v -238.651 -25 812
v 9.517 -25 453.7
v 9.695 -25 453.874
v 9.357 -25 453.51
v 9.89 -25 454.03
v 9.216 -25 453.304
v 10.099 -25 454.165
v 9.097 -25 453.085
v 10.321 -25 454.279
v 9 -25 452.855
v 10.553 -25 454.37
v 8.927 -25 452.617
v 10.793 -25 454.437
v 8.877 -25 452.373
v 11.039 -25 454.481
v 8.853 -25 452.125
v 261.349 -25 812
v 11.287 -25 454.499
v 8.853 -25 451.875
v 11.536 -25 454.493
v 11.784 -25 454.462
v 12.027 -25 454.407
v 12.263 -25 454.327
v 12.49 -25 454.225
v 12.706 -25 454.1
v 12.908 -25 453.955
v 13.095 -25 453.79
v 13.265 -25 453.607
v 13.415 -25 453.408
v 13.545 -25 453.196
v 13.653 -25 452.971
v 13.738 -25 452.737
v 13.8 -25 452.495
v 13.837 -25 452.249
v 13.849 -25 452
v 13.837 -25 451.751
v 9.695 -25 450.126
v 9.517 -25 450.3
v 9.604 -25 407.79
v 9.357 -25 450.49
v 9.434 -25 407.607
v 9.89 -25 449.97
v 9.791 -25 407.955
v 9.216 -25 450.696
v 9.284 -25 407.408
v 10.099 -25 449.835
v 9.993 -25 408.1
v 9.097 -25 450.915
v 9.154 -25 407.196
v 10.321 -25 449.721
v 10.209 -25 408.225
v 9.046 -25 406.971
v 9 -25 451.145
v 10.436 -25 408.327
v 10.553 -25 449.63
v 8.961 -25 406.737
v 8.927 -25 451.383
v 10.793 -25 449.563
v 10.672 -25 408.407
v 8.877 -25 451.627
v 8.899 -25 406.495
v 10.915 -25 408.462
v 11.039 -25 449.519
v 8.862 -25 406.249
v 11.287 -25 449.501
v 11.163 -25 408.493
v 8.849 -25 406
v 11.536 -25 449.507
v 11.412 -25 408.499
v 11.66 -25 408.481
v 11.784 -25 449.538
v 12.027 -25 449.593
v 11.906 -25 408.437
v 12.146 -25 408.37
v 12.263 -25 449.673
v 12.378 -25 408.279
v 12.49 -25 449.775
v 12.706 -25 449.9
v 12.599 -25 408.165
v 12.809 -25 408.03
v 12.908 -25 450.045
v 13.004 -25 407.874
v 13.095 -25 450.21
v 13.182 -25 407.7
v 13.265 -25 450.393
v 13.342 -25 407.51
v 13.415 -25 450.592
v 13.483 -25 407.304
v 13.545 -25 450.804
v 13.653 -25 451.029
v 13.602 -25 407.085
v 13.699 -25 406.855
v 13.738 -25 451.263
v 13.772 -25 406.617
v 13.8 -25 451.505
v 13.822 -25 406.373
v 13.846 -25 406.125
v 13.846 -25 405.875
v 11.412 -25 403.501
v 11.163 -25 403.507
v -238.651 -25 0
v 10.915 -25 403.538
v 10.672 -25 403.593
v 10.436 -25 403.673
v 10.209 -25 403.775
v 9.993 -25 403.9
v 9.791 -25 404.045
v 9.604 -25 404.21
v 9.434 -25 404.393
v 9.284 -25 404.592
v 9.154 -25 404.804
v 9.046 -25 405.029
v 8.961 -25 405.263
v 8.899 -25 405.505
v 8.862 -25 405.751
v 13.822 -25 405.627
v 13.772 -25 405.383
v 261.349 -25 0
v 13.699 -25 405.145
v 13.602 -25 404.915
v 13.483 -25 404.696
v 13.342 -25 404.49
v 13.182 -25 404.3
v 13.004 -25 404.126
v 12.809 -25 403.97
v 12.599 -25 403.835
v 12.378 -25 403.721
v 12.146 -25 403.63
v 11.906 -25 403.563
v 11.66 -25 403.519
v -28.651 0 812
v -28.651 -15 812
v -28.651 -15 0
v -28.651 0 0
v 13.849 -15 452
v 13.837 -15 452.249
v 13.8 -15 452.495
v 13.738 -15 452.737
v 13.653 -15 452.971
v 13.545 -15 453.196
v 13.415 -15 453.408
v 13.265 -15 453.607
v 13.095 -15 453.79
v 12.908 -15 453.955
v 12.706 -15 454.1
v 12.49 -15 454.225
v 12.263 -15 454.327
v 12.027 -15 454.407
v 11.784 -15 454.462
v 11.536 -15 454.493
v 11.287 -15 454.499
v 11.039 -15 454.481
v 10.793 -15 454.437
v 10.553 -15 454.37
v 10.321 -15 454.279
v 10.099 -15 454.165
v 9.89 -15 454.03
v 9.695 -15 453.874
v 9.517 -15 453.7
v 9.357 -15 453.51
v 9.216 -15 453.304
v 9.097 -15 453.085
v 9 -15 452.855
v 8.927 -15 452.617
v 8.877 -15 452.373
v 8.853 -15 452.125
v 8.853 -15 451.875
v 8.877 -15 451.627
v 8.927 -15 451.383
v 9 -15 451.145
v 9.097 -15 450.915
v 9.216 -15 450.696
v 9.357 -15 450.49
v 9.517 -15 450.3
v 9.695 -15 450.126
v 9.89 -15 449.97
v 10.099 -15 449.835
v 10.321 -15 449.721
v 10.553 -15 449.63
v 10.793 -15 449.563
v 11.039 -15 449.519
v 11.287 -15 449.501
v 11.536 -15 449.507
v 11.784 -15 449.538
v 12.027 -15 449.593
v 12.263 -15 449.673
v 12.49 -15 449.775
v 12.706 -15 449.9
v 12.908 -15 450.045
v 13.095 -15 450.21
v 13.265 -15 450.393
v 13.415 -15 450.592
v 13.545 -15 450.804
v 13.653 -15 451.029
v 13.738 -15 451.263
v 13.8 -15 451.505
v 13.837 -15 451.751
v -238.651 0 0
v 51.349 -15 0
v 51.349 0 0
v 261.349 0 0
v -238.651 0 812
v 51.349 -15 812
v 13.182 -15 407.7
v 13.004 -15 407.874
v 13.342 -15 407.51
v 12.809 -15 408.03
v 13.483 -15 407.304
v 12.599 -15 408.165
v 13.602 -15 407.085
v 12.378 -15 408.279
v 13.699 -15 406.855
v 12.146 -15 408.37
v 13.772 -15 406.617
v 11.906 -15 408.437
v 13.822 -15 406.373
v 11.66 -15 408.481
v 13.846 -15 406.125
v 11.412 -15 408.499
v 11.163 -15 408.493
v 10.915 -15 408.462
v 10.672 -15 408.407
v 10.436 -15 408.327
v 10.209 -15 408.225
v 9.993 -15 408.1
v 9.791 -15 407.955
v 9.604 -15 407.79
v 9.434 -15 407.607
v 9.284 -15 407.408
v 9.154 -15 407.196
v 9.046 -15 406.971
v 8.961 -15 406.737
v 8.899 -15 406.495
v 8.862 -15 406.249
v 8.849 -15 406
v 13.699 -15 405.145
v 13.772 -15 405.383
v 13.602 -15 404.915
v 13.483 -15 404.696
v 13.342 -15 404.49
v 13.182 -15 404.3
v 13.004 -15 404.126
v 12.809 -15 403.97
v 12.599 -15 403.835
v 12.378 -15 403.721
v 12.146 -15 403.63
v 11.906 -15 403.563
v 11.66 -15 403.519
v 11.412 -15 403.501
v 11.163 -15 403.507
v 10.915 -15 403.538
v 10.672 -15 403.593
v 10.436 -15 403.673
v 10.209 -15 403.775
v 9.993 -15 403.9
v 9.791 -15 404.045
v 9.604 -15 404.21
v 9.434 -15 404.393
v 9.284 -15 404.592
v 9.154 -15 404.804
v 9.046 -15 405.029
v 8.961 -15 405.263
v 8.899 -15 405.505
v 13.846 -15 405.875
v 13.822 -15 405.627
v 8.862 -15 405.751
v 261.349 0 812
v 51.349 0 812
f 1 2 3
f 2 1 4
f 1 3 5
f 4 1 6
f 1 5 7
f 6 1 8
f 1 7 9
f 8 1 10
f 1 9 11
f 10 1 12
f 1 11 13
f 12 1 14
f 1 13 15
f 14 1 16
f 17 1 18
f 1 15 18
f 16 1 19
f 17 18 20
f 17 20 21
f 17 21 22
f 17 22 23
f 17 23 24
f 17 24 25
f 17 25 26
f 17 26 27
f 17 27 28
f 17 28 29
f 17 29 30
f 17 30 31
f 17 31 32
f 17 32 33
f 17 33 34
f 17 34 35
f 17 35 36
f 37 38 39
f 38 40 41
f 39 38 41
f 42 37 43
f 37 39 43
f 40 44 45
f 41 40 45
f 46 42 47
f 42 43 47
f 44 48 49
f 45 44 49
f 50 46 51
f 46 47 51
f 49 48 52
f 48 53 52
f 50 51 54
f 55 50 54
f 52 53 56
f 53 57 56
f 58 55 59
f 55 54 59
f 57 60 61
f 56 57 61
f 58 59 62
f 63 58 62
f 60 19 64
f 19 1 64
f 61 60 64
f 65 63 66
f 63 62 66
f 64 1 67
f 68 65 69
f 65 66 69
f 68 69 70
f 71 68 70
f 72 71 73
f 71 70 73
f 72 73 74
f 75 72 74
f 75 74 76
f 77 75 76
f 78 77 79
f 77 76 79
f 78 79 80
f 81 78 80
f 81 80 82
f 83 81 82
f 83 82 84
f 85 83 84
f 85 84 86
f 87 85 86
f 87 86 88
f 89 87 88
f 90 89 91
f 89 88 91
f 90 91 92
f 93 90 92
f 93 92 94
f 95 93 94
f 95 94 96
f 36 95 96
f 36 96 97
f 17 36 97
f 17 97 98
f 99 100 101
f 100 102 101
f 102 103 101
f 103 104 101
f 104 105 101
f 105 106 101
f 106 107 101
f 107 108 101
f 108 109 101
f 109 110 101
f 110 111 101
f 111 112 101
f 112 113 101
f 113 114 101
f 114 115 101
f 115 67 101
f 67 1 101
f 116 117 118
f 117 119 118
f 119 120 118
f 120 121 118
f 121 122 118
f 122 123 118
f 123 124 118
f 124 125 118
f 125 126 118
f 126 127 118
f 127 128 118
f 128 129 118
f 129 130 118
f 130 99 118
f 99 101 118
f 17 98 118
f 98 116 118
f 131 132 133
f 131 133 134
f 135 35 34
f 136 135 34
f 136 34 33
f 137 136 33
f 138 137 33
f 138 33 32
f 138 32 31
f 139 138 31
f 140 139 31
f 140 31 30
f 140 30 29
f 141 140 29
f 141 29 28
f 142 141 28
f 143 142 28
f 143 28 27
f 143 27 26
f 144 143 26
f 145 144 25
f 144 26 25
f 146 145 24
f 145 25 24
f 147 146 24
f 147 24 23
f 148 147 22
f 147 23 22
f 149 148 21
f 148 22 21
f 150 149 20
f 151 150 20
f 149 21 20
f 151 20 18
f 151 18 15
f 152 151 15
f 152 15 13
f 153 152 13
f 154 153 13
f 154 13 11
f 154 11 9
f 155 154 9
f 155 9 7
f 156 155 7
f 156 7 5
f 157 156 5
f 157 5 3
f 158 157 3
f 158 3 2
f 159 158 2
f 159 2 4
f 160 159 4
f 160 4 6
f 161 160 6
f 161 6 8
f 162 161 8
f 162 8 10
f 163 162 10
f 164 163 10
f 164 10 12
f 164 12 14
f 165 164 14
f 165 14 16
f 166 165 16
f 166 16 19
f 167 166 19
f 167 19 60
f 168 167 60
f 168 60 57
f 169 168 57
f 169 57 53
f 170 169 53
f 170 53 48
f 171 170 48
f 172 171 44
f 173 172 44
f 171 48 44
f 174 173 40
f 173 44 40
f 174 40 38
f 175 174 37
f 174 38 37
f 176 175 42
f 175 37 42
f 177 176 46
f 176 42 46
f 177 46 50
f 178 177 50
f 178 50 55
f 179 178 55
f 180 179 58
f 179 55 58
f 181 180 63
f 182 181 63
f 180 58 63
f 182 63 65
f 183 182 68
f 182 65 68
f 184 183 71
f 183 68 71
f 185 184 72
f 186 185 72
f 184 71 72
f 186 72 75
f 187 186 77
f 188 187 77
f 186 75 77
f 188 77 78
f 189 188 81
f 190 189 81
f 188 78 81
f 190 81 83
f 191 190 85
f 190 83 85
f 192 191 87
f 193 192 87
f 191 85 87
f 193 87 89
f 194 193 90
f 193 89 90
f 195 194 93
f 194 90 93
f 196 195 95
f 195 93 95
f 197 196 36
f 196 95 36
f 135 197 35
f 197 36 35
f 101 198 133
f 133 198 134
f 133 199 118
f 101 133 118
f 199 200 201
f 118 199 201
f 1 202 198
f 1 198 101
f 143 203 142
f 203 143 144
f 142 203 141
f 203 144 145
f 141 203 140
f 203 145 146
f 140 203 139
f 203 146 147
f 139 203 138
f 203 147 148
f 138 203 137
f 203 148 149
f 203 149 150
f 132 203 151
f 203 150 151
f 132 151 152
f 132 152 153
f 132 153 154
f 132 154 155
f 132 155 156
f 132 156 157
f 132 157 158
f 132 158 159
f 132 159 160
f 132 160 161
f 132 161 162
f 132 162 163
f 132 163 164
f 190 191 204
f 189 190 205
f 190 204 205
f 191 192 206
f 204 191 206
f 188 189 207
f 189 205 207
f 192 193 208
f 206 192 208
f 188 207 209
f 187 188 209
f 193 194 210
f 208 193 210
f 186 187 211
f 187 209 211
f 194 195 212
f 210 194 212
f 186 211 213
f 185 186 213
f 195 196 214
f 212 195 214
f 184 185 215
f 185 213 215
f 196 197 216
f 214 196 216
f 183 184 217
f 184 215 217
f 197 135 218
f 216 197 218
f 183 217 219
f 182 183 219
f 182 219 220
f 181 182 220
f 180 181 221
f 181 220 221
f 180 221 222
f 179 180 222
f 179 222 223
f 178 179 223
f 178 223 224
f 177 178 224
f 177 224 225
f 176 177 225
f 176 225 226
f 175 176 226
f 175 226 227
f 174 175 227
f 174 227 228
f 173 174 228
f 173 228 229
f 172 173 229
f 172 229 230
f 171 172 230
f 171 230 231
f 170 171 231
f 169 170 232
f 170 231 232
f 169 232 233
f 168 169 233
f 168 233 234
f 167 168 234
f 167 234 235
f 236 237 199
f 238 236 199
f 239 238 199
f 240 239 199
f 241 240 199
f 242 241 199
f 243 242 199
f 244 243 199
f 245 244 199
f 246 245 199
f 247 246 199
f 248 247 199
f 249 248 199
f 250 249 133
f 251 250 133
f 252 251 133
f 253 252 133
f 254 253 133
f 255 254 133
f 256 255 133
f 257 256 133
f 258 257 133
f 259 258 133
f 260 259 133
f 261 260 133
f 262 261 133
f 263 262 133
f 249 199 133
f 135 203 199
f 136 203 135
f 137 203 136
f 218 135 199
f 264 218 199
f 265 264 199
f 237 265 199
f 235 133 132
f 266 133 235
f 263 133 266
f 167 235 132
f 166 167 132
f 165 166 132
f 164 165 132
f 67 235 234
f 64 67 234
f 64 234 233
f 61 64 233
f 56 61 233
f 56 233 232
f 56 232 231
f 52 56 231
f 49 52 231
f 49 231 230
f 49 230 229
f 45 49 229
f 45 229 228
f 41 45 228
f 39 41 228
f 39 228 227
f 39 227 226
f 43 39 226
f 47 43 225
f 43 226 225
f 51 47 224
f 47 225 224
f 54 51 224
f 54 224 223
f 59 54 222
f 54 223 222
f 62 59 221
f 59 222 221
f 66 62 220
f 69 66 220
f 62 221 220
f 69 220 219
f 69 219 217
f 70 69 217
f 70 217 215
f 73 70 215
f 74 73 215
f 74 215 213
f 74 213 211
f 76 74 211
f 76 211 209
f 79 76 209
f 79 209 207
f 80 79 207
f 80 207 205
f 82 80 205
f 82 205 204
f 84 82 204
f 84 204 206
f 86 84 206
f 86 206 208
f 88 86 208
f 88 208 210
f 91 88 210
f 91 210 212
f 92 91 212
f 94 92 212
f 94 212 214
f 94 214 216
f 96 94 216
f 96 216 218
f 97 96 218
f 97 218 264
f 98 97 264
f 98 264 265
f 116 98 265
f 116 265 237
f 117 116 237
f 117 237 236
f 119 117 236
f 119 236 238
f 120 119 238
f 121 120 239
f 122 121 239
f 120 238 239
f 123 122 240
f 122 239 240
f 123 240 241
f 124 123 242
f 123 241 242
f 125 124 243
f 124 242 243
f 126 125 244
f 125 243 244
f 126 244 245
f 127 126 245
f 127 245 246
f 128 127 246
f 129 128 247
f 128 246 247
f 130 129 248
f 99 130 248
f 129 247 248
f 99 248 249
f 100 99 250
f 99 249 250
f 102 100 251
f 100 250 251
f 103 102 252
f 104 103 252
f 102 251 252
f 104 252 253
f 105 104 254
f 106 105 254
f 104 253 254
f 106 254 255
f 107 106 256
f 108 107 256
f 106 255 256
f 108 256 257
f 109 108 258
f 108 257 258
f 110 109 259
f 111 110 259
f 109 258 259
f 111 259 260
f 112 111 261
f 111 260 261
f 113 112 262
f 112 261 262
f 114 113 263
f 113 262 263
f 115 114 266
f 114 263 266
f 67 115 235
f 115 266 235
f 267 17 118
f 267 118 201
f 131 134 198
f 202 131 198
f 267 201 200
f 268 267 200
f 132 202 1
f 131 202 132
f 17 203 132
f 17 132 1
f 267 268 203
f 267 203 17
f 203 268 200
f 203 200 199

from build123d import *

# Parameters (mm, degrees)
F1_DEPTH = 812
F2_R     = 2.5
F3_DEPTH = 10.001
F4_R     = 2.5
F5_DEPTH = 25.001


with BuildPart() as f1:
    # F0 (on Top) → F1 (new body)
    with BuildSketch(Plane.XY):
        Polygon((-28.650518, 0), (-238.650518, 0), (-238.650518, -25), (261.349482, -25), (261.349482, 0), (51.349482, 0), (51.349482, -15), (-28.650518, -15), align=None)
    extrude(amount=F1_DEPTH)

    # F2 (on face) → F3 (cut, through all)
    with BuildSketch(Plane(origin=(0, -15, 0), x_dir=(-1, 0, 0), z_dir=(0, 1, 0))):
        with Locations((-11.349482, 406)):
            Circle(F2_R)
    extrude(amount=-F3_DEPTH, mode=Mode.SUBTRACT)

    # F4 (on face) → F5 (cut, through all)
    with BuildSketch(Plane.XZ.offset(25)):
        with Locations((11.349482, 452)):
            Circle(F4_R)
    extrude(amount=-F5_DEPTH, mode=Mode.SUBTRACT)


solid = f1.part
